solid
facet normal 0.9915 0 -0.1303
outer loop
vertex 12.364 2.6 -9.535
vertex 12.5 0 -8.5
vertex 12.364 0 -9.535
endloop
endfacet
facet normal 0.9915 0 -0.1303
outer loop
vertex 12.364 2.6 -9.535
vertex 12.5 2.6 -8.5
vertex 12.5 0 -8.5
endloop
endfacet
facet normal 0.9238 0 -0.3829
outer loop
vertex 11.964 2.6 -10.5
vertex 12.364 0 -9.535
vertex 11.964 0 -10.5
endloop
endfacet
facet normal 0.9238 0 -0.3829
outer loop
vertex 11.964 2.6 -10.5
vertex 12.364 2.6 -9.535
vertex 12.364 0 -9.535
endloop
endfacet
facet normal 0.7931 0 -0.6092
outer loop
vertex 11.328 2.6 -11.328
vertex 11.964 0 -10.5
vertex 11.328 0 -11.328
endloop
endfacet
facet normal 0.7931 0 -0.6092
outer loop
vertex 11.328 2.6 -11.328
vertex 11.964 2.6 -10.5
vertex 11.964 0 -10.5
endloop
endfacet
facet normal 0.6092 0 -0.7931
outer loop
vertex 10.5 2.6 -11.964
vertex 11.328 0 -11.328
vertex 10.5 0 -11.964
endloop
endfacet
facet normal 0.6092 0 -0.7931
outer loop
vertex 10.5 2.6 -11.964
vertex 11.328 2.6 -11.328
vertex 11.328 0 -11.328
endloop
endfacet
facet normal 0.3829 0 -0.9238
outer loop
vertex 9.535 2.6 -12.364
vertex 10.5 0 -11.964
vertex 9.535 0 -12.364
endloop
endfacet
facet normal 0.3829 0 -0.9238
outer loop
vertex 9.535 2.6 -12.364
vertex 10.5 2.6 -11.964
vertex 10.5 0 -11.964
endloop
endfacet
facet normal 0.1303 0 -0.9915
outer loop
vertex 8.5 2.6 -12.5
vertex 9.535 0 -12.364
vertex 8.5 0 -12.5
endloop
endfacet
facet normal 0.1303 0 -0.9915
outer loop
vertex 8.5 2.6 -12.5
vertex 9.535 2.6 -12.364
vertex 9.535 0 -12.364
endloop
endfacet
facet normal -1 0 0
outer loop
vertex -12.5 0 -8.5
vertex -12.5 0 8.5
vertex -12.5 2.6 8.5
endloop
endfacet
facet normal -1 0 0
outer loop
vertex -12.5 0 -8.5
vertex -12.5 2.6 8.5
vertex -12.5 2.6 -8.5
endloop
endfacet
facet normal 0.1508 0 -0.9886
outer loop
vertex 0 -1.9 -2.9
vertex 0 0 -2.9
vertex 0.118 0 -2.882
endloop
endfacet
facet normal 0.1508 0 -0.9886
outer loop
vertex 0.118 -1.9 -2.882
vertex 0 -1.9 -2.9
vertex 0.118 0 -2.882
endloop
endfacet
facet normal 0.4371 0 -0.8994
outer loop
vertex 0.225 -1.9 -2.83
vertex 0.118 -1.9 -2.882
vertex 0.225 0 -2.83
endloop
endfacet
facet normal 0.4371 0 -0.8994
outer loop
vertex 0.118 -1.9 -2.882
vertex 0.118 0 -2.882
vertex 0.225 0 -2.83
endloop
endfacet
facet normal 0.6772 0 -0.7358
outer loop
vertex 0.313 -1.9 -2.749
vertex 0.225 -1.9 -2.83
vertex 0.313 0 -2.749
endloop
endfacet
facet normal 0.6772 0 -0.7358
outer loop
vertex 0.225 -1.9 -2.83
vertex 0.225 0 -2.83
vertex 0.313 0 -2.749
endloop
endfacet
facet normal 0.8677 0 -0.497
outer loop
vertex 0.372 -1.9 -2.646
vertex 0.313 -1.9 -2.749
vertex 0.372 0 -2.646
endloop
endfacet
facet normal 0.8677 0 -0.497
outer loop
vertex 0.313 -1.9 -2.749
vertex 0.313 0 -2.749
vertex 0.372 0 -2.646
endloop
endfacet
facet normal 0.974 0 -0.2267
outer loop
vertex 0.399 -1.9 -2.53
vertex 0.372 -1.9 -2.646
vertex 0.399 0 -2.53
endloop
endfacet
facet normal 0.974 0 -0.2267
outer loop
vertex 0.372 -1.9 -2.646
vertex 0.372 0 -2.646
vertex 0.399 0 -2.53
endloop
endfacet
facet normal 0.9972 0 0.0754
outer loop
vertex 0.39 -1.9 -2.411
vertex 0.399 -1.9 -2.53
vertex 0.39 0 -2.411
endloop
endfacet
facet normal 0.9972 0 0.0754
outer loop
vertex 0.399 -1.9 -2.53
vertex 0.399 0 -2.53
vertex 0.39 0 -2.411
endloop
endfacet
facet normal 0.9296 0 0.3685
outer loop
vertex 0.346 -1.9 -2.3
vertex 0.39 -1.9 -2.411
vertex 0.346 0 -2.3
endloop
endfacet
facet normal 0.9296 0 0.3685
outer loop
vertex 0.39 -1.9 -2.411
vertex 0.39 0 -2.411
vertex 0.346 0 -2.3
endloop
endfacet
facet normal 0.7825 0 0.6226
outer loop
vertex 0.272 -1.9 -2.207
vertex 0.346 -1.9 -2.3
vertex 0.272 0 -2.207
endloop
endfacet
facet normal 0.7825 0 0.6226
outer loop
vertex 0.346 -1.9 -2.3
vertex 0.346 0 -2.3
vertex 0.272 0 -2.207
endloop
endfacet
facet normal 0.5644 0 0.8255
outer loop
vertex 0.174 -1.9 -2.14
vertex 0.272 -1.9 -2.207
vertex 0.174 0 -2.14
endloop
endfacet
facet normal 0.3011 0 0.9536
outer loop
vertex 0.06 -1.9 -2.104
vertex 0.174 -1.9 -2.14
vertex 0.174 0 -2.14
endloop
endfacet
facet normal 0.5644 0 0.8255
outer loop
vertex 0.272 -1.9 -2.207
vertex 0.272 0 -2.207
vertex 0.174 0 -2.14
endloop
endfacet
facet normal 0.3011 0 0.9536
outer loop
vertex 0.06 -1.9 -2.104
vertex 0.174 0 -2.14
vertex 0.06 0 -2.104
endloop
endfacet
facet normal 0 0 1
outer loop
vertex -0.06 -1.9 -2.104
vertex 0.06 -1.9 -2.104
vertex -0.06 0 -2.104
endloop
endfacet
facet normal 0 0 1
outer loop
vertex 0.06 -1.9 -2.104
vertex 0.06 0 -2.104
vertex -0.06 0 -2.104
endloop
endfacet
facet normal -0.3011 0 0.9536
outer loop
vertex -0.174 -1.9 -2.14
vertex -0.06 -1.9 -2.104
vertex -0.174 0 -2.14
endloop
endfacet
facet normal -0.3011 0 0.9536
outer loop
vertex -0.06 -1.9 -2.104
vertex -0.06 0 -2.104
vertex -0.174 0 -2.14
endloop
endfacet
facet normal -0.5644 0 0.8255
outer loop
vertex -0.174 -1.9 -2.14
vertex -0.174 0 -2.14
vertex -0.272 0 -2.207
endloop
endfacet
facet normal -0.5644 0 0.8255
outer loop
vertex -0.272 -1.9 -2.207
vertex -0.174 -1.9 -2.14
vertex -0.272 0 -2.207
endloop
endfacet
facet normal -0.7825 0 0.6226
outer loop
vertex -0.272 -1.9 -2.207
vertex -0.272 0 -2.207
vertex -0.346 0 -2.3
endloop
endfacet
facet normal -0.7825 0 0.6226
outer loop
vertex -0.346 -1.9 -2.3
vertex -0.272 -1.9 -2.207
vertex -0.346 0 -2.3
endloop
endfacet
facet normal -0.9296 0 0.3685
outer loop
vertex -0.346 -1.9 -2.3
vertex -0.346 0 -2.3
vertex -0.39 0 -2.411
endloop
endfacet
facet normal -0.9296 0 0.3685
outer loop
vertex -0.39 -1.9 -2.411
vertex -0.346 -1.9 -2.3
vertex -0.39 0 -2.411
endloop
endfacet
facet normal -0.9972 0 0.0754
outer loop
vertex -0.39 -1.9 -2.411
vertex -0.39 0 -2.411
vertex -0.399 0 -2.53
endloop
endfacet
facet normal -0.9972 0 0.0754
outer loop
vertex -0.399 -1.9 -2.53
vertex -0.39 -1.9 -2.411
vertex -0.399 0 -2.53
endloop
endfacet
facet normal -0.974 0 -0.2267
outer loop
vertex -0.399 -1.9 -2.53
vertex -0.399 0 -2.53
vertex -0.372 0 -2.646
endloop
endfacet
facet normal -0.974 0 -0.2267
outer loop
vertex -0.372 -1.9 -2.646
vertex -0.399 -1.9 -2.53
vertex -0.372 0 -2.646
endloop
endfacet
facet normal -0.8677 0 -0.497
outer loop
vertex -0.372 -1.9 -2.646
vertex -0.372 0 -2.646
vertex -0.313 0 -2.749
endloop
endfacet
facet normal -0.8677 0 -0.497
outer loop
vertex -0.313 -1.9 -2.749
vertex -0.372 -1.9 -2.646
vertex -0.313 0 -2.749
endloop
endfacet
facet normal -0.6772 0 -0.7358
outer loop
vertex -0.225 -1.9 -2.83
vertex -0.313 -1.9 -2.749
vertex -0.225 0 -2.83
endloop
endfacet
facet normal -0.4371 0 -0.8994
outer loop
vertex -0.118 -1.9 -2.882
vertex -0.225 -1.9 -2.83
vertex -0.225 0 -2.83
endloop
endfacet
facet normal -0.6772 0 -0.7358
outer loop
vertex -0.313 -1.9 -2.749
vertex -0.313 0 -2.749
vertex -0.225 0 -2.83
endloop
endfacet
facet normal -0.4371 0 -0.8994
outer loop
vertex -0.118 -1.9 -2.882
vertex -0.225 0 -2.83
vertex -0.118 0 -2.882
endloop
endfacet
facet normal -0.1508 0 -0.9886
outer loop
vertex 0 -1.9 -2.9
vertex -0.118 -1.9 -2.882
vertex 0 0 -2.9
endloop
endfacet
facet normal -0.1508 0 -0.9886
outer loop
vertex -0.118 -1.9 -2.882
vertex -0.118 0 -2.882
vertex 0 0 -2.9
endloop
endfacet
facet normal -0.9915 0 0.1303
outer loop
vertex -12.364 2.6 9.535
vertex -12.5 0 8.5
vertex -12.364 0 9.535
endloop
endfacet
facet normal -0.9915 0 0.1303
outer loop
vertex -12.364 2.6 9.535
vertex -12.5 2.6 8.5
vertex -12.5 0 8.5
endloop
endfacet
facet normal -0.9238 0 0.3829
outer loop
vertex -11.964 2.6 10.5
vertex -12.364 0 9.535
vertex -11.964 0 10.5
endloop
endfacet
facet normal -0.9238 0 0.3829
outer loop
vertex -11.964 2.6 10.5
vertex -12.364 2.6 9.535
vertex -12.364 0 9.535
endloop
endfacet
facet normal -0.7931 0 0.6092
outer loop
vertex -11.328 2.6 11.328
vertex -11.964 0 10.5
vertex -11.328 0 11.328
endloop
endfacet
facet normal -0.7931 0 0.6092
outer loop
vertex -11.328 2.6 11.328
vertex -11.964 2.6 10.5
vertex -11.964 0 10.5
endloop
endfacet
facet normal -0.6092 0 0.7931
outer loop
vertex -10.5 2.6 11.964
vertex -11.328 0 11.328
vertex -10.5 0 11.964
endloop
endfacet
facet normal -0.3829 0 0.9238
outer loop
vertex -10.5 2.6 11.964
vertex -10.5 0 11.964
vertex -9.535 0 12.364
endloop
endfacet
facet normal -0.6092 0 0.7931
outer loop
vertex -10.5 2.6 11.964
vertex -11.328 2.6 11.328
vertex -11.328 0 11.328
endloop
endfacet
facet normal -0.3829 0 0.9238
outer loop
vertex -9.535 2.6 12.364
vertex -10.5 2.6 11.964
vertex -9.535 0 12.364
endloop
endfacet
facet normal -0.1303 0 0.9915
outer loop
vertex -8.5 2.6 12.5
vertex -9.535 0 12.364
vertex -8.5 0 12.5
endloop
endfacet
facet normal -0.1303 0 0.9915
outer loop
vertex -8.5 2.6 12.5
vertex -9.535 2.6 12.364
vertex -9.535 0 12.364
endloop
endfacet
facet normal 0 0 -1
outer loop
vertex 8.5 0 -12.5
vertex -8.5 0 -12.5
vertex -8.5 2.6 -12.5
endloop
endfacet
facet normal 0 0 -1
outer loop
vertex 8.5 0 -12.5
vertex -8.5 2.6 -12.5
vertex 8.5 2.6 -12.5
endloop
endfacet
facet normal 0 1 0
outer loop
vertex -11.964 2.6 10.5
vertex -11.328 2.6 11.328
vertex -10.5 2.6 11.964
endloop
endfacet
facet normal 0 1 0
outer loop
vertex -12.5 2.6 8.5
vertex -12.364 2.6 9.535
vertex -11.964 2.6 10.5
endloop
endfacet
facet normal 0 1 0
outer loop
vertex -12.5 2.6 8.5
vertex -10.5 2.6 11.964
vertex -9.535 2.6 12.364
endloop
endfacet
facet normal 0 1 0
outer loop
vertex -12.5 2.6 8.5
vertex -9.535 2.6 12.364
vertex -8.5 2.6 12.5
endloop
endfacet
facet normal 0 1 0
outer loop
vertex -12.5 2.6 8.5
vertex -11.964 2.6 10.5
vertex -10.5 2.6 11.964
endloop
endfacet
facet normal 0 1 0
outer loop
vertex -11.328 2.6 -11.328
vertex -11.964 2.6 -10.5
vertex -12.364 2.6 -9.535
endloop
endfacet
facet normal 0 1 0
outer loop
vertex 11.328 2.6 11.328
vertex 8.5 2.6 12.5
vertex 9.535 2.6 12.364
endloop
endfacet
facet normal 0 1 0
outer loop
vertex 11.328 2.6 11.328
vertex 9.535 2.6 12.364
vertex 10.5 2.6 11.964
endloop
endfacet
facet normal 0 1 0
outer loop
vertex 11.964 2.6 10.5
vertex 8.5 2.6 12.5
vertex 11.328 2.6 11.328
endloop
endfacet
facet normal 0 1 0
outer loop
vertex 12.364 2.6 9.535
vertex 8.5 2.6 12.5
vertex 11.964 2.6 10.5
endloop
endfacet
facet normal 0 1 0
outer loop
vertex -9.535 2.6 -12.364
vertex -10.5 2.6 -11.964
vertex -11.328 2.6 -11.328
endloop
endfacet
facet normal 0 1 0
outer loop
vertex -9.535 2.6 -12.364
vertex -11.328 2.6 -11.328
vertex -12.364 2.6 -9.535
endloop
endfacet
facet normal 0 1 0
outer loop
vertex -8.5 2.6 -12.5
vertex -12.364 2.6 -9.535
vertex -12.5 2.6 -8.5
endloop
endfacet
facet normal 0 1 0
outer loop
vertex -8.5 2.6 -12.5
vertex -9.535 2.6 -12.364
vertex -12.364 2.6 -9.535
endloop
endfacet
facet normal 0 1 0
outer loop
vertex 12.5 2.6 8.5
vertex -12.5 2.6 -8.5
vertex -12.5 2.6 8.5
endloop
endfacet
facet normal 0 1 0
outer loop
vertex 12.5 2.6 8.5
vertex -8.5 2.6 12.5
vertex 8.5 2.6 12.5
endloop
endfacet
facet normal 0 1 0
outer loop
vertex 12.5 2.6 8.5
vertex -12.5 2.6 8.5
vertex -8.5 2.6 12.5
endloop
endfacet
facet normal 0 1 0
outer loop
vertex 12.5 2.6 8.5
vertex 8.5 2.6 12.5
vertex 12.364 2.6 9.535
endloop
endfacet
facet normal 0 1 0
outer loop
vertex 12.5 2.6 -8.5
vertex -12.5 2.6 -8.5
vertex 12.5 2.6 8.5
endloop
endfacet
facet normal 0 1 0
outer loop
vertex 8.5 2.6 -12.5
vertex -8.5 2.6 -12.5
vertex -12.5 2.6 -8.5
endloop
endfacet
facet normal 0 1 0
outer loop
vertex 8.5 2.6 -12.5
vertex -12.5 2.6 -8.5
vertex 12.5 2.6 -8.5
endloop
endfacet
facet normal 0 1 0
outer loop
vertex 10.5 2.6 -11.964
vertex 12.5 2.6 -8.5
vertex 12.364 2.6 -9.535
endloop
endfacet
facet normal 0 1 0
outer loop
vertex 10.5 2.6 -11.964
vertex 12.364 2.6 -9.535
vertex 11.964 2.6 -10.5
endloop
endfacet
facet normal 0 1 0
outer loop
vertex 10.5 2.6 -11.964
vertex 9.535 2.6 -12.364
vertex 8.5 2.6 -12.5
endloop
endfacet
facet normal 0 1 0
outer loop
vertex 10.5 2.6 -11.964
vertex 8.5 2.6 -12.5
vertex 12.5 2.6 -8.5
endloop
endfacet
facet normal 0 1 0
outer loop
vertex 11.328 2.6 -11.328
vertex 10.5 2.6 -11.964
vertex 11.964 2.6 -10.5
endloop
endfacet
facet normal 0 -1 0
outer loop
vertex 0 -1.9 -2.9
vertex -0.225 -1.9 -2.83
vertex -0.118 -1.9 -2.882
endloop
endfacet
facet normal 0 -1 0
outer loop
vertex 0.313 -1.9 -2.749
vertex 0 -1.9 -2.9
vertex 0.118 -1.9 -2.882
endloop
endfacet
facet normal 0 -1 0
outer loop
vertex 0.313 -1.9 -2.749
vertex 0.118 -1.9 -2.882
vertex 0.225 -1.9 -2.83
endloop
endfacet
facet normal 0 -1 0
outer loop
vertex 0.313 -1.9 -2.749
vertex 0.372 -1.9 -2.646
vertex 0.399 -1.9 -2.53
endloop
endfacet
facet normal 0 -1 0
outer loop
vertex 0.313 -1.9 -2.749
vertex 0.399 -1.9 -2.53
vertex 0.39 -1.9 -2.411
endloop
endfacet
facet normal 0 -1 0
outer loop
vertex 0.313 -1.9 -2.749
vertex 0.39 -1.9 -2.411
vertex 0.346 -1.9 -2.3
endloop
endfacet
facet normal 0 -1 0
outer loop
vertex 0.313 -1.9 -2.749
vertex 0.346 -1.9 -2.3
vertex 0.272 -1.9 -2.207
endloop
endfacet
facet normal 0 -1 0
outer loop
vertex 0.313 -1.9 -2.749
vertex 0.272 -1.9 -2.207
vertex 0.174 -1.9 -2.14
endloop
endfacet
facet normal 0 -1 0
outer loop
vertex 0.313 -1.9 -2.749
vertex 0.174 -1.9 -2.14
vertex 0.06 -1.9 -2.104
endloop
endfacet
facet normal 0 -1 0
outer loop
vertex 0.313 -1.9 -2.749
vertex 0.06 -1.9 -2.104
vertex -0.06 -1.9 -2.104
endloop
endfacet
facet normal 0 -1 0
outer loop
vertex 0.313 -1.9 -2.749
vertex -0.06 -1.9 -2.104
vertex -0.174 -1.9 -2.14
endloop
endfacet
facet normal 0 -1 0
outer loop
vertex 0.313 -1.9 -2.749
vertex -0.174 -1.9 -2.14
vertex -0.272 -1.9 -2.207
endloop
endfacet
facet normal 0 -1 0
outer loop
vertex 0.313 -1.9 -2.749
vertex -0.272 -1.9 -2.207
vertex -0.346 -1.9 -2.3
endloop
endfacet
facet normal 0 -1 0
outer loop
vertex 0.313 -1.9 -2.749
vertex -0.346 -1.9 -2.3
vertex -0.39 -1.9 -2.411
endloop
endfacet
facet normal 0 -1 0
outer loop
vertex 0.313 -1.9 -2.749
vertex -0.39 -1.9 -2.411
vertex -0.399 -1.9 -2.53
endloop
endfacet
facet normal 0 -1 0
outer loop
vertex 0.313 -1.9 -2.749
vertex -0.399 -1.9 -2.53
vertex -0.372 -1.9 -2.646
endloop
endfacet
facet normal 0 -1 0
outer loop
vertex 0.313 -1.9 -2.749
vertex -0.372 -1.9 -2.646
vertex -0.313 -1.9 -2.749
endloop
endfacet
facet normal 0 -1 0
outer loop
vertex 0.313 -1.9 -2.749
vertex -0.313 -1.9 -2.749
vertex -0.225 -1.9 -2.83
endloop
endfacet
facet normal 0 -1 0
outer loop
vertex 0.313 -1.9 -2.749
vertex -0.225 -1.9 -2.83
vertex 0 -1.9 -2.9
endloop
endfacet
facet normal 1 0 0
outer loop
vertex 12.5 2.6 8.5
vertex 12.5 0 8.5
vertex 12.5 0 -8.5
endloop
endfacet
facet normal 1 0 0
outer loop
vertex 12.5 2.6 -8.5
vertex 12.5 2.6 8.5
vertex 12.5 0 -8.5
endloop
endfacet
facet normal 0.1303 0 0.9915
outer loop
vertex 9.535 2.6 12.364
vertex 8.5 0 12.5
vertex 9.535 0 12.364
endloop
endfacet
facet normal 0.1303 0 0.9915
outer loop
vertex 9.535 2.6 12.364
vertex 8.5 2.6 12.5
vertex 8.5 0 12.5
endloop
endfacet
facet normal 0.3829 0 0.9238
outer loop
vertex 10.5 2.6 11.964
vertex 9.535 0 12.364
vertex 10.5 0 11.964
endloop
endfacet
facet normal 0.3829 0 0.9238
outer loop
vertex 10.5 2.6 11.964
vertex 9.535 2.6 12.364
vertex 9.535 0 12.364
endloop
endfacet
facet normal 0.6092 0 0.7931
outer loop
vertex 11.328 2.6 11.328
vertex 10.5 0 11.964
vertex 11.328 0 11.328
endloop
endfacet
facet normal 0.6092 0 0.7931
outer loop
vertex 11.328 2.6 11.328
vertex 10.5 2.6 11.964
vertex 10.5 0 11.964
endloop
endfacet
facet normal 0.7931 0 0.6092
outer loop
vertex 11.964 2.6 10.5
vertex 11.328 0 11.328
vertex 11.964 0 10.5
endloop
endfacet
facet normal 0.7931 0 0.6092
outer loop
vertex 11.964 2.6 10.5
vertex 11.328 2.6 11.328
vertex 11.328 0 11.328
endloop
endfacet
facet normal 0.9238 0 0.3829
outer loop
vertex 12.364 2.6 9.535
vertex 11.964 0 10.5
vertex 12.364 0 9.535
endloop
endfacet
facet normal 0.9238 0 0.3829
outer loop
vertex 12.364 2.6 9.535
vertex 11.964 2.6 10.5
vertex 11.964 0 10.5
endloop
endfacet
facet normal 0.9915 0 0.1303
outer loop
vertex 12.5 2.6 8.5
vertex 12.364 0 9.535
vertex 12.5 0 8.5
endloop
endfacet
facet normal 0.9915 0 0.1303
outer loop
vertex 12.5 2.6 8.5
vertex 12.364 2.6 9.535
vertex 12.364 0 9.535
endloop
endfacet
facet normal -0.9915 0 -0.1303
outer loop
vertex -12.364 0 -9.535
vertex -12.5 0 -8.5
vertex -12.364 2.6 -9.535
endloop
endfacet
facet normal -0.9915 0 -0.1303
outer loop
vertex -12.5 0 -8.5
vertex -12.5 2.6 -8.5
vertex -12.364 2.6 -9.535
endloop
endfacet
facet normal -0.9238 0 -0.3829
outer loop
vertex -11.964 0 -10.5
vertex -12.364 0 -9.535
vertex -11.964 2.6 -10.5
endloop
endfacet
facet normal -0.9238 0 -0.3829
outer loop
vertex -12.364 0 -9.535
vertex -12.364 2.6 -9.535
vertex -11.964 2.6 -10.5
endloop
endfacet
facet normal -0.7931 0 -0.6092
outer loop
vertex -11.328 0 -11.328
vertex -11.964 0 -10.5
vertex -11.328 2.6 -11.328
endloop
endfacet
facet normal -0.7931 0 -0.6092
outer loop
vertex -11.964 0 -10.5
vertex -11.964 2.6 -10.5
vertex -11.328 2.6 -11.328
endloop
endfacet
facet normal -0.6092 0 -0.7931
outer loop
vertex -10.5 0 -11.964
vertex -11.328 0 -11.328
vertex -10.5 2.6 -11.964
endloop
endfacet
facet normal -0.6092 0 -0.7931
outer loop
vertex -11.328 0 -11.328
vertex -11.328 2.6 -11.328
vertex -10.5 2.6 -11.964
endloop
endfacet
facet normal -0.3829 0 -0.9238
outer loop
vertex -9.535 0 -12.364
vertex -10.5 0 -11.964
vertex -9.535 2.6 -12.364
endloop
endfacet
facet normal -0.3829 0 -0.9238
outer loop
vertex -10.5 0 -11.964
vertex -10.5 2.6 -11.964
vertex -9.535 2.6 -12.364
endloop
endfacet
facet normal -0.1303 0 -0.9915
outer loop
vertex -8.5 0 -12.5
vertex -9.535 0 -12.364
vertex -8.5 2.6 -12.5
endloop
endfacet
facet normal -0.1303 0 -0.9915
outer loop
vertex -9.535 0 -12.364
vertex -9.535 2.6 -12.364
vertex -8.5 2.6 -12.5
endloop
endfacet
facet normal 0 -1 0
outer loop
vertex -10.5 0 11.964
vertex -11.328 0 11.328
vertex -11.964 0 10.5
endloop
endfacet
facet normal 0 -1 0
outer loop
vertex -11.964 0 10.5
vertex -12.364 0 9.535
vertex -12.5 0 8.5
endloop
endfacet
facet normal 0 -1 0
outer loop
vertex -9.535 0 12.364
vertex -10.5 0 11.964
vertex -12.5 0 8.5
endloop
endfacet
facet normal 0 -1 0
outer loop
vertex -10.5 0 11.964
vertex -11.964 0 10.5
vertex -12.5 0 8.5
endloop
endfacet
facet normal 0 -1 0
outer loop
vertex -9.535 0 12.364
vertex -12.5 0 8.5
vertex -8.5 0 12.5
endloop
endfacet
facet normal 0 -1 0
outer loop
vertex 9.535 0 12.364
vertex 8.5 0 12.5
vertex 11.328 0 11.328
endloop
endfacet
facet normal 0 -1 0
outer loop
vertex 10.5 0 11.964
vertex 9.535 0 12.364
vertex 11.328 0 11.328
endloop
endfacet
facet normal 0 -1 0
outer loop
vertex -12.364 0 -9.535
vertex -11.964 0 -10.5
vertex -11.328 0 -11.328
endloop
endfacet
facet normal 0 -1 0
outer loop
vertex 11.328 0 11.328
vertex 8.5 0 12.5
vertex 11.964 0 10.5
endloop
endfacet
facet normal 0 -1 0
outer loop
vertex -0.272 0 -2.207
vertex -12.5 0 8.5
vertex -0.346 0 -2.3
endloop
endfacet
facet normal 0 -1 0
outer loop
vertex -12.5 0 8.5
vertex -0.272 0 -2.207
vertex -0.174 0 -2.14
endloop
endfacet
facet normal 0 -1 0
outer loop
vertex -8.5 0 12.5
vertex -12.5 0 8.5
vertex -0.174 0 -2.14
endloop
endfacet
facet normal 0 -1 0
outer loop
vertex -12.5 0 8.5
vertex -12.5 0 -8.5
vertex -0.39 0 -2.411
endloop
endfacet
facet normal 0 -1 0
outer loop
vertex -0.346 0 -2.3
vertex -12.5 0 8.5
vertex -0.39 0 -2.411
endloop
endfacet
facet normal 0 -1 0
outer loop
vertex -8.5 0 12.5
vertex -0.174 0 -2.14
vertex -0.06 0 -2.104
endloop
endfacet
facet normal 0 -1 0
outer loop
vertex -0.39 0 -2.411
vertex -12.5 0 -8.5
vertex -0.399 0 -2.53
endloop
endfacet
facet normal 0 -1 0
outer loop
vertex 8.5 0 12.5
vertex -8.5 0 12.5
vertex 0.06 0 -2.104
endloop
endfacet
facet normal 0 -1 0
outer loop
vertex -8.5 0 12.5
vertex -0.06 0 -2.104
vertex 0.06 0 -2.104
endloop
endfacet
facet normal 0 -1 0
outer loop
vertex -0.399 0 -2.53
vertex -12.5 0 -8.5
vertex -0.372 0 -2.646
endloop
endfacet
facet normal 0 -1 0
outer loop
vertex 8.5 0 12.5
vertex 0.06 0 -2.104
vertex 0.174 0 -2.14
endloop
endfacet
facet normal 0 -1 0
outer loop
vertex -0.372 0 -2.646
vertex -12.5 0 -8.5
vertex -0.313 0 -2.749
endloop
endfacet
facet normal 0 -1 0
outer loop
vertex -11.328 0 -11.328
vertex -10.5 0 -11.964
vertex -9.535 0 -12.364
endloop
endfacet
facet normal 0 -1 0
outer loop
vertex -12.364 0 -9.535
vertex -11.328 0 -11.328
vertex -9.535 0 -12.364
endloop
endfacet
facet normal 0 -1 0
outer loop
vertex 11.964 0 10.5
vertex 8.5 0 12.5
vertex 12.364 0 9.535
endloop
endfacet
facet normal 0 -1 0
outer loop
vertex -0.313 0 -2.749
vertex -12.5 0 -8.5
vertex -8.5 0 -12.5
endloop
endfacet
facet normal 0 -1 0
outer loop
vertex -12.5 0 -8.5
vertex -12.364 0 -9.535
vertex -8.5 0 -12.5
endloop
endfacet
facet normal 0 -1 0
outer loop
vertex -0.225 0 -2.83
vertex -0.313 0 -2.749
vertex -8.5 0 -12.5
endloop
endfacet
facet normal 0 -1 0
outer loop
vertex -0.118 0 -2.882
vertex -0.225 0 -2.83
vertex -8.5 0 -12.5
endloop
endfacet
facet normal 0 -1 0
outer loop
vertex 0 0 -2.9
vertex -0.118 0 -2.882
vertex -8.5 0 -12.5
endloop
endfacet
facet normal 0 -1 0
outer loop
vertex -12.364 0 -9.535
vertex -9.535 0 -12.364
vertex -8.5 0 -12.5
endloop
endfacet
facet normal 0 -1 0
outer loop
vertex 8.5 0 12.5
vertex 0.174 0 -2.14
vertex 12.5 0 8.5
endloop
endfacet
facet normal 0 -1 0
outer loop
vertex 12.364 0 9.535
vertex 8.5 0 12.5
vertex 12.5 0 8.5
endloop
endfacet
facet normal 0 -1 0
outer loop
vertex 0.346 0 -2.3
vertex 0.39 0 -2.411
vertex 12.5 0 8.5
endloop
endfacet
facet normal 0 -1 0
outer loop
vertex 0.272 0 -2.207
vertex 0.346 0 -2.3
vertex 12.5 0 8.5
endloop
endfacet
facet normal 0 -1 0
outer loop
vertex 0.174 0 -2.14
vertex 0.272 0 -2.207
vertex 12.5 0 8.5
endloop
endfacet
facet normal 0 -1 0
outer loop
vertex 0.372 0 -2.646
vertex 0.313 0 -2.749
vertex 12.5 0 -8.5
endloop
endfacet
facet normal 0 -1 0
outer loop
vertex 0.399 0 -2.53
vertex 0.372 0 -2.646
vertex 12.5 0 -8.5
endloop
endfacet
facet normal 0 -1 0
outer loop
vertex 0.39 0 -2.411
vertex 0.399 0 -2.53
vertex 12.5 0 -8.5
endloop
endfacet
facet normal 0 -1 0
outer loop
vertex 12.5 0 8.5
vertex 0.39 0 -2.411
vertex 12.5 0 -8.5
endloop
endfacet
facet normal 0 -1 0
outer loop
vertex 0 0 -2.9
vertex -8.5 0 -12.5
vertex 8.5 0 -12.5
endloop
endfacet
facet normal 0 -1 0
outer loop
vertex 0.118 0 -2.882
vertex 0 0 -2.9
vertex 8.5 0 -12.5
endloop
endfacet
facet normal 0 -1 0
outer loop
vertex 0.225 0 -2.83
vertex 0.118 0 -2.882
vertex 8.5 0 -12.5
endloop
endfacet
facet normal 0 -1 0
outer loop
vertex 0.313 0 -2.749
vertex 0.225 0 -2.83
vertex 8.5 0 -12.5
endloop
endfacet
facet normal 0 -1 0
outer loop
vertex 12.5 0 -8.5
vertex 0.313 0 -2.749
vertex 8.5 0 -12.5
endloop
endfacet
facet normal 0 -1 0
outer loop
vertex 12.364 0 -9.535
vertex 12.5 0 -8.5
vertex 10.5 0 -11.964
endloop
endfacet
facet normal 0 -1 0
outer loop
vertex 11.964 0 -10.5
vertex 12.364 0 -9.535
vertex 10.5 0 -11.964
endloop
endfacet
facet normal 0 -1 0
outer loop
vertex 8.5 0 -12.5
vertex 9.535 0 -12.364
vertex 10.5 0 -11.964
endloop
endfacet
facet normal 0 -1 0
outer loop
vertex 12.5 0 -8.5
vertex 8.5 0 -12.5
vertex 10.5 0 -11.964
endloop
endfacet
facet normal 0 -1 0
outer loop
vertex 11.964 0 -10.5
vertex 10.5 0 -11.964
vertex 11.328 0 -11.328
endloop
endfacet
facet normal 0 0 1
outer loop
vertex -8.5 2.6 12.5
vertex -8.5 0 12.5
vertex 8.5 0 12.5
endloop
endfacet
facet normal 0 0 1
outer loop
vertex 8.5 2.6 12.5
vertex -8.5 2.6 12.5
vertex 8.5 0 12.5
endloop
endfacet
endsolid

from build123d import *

# Parameters (mm, degrees)
SKETCH1_W           = 25
SKETCH1_H           = 25
BOSS_EXTRUDE1_DEPTH = 2.6
FILLET1_R           = 4
SKETCH2_R           = 0.4
BOSS_EXTRUDE2_DEPTH = 1.9


with BuildPart() as part:
    # Sketch1 → Boss-Extrude1 (new body)
    with BuildSketch(Plane(origin=(0, 0, 0), x_dir=(1, 0, 0), z_dir=(0, 1, 0))):
        Rectangle(SKETCH1_W, SKETCH1_H)
    extrude(amount=BOSS_EXTRUDE1_DEPTH)

    # Fillet1
    fillet1_edges = [part.edges().sort_by_distance(p)[0] for p in [
        (12.5, 1.3, 12.5),
        (-12.5, 1.3, 12.5),
        (-12.5, 1.3, -12.5),
        (12.5, 1.3, -12.5),
    ]]
    fillet(fillet1_edges, radius=FILLET1_R)

    # Sketch2 → Boss-Extrude2 (add)
    with BuildSketch(Plane.XZ):
        with Locations(Location((0, -2.5, 0), (0, 0, 270))):  # turned: the seam where the file's is
            Circle(SKETCH2_R)
    extrude(amount=BOSS_EXTRUDE2_DEPTH)


solid = part.part
